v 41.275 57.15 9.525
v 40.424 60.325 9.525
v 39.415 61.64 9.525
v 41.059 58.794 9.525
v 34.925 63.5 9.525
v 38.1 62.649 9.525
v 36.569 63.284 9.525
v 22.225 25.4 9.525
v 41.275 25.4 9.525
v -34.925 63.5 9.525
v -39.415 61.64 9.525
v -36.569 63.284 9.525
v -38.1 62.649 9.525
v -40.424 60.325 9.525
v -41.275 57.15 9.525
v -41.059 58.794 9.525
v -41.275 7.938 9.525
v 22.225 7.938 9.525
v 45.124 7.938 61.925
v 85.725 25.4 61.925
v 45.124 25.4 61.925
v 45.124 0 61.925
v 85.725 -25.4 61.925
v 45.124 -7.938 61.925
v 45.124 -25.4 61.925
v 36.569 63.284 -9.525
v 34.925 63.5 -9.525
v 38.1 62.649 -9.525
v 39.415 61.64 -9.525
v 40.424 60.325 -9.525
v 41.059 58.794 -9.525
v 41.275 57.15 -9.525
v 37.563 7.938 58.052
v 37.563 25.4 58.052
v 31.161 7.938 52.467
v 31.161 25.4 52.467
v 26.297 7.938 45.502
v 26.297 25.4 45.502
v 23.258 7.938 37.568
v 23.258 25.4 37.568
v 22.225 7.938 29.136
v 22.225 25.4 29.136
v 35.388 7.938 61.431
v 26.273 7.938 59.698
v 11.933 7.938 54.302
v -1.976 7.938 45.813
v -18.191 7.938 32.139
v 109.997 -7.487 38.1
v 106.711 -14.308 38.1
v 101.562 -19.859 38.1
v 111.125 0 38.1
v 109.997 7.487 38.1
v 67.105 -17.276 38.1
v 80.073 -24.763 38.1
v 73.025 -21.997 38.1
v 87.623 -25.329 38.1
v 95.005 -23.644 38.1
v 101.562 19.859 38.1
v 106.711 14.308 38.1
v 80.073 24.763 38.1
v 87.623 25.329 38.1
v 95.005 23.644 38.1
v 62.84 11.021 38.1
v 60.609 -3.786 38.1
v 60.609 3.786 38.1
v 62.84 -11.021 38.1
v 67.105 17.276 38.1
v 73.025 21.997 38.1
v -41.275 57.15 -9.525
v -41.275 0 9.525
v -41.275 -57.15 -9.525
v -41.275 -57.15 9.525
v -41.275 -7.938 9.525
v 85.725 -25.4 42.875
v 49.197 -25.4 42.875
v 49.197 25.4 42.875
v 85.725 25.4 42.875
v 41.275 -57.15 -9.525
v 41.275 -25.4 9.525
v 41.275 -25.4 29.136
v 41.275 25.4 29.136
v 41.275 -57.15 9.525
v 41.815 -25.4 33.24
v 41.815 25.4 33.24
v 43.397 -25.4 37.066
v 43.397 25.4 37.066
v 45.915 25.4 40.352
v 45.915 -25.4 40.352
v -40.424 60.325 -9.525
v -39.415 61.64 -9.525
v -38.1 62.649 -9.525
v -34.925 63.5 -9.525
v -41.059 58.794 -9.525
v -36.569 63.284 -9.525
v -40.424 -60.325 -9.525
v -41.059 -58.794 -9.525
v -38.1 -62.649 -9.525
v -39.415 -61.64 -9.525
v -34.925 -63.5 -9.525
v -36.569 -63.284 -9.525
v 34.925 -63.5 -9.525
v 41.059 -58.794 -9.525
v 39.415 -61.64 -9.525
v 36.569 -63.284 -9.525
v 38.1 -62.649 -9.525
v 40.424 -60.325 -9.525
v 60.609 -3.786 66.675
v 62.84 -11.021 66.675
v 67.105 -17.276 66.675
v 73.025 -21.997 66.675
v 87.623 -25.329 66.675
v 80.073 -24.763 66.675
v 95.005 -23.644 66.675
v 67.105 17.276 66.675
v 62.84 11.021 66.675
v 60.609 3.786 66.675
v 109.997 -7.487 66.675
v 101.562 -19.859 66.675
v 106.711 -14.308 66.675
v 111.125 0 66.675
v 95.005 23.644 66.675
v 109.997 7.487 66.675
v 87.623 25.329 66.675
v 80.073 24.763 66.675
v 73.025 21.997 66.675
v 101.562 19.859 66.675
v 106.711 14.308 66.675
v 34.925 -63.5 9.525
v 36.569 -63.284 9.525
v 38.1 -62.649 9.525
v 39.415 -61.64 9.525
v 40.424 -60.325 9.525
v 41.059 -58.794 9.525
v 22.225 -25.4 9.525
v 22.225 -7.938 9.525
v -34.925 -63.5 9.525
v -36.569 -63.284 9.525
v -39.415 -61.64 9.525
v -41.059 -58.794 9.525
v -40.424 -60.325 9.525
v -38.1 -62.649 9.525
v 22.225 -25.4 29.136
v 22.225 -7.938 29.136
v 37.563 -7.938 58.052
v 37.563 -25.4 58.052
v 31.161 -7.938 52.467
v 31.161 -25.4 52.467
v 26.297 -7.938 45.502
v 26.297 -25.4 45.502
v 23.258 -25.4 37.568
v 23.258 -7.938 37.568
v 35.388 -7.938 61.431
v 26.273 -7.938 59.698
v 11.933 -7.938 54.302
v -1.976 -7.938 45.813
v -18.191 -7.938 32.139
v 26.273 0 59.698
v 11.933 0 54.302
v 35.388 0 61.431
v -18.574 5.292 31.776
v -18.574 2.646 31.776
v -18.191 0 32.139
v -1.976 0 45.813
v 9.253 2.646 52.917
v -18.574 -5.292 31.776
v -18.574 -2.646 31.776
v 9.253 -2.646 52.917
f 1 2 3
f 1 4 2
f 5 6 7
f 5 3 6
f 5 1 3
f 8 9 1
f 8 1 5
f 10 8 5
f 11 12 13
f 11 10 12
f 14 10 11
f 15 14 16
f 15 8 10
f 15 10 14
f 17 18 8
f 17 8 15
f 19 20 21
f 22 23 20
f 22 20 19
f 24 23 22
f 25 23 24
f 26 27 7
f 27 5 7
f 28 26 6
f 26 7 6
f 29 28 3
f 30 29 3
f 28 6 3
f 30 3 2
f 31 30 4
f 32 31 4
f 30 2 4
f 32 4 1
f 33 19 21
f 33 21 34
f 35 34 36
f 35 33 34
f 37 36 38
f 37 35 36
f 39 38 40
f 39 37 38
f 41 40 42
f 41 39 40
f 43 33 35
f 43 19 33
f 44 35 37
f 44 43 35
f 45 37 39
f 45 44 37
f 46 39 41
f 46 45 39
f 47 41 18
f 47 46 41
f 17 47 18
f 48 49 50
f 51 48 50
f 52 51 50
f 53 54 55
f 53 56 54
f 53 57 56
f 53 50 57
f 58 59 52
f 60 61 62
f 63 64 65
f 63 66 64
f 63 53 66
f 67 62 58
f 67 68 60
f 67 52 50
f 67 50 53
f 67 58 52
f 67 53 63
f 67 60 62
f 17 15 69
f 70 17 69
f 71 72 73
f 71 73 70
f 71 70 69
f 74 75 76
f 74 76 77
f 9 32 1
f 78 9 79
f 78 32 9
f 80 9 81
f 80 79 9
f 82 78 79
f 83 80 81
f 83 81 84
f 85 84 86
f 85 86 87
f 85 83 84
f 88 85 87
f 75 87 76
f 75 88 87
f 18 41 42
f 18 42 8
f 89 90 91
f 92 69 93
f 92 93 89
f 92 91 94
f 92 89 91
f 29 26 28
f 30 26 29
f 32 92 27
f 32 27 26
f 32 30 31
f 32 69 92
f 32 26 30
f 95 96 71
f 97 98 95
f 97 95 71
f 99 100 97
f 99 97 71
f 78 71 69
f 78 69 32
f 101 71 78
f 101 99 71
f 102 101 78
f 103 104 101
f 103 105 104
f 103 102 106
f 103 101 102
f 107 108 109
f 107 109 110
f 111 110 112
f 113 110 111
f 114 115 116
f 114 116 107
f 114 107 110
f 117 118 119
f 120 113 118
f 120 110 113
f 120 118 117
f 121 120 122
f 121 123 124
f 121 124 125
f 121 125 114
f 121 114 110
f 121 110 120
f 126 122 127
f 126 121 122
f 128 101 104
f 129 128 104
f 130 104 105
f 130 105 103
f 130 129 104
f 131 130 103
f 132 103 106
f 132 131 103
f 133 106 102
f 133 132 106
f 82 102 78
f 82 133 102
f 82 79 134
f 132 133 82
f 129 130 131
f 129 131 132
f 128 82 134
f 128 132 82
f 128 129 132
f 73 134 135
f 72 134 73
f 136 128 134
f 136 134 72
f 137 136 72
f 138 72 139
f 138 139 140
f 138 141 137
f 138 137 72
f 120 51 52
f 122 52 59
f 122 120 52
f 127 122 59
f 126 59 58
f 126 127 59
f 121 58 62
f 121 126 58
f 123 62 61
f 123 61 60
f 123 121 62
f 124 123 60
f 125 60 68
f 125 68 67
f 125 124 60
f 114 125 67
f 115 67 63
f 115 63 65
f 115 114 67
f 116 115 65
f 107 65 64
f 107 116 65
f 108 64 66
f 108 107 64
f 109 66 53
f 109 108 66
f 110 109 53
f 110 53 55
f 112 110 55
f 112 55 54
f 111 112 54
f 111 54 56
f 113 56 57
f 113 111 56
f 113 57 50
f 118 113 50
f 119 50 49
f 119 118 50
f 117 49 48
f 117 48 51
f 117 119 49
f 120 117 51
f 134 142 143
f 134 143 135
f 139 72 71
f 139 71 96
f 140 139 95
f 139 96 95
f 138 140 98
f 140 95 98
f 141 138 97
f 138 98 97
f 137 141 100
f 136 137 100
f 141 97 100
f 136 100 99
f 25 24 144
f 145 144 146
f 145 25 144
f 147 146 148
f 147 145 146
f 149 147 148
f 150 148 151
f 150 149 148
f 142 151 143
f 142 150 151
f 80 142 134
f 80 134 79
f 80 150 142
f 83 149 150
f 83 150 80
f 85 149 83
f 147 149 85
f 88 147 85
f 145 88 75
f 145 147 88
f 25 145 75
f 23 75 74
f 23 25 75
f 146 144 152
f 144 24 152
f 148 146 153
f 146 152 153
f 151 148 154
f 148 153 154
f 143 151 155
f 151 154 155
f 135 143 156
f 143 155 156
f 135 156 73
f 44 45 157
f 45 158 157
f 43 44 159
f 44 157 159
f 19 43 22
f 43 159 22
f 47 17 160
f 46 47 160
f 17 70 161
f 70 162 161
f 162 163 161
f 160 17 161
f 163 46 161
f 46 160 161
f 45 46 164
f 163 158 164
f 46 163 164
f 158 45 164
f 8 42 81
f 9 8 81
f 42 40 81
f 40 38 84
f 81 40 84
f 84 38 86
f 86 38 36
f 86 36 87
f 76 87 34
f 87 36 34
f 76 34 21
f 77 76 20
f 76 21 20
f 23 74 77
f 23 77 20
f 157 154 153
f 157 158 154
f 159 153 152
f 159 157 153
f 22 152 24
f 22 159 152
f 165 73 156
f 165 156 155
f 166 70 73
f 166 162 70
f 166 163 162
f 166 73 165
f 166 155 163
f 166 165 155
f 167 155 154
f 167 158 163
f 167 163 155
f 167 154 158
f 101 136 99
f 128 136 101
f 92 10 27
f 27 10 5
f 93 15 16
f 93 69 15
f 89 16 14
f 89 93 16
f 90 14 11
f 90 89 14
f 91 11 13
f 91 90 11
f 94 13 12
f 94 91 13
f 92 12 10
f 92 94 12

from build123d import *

# Parameters (mm, degrees)
F1_DEPTH = 63.5
F0_W     = 25.4
F0_H     = 19.05
F2_DEPTH = 25.4
F3_DEPTH = 7.9375
F5_R     = 6.35


with BuildPart() as f1:
    # F0 (on Front) → F1 (new body, symmetric)
    with BuildSketch(Plane.XZ):
        Polygon((22.225, 9.525), (-41.275, 9.525), (-41.275, -9.525), (41.275, -9.525), (41.275, 9.525), align=None)
    extrude(amount=F1_DEPTH, both=True)

    # F0 (on Front) → F2 (join, symmetric)
    with BuildSketch(Plane.XZ):
        with BuildLine():
            Line((22.225, 29.1359246056), (22.225, 9.525))
            Line((22.225, 9.525), (41.275, 9.525))
            Line((41.275, 9.525), (41.275, 29.1359246056))
            ThreePointArc((41.275, 29.1359246056), (43.397414206, 37.0657423196), (49.1971428634, 42.8752))
            Line((49.1971428634, 42.8752), (60.325, 42.8752))
            Line((60.325, 42.8752), (60.325, 61.9252))
            Line((60.325, 61.9252), (45.1242341571, 61.9252))
            ThreePointArc((45.1242341571, 61.9252), (28.5164925562, 49.1328712842), (22.225, 29.1359246056))
        make_face()
        with Locations((73.025, 52.4002)):
            Rectangle(F0_W, F0_H)
    extrude(amount=F2_DEPTH, both=True)

    # F0 (on Front) → F3 (join, symmetric)
    with BuildSketch(Plane.XZ):
        with BuildLine():
            add(Edge.make_bspline(
                [(-41.275, 9.525), (-20.1643432395, 28.6567257552), (4.2580552399, 62.6568291336), (45.1242341571, 61.9252)],
                knots=[0, 0, 0, 0, 101.0475562445, 101.0475562445, 101.0475562445, 101.0475562445], degree=3))
            Line((-41.275, 9.525), (22.225, 9.525))
            Line((22.225, 9.525), (22.225, 29.1359246056))
            ThreePointArc((22.225, 29.1359246056), (28.5164925562, 49.1328712842), (45.1242341571, 61.9252))
        make_face()
    extrude(amount=F3_DEPTH, both=True)

    # F5
    f5_edges = [f1.edges().sort_by_distance(p)[0] for p in [
        (-41.275, -63.5, 0),
        (41.275, -63.5, 0),
        (-41.275, 63.5, 0),
        (41.275, 63.5, 0),
    ]]
    fillet(f5_edges, radius=F5_R)


with BuildPart() as f4:
    # F0 (on Front) → F4 (revolve)
    with BuildSketch(Plane.XZ):
        Polygon((85.725, 66.675), (85.725, 61.9252), (85.725, 42.8752), (85.725, 38.1), (111.125, 38.1), (111.125, 66.675), align=None)
    revolve(axis=Axis((85.725, 0, 52.3875), (0, 0, 1)))


solid = Compound([f1.part, f4.part])
